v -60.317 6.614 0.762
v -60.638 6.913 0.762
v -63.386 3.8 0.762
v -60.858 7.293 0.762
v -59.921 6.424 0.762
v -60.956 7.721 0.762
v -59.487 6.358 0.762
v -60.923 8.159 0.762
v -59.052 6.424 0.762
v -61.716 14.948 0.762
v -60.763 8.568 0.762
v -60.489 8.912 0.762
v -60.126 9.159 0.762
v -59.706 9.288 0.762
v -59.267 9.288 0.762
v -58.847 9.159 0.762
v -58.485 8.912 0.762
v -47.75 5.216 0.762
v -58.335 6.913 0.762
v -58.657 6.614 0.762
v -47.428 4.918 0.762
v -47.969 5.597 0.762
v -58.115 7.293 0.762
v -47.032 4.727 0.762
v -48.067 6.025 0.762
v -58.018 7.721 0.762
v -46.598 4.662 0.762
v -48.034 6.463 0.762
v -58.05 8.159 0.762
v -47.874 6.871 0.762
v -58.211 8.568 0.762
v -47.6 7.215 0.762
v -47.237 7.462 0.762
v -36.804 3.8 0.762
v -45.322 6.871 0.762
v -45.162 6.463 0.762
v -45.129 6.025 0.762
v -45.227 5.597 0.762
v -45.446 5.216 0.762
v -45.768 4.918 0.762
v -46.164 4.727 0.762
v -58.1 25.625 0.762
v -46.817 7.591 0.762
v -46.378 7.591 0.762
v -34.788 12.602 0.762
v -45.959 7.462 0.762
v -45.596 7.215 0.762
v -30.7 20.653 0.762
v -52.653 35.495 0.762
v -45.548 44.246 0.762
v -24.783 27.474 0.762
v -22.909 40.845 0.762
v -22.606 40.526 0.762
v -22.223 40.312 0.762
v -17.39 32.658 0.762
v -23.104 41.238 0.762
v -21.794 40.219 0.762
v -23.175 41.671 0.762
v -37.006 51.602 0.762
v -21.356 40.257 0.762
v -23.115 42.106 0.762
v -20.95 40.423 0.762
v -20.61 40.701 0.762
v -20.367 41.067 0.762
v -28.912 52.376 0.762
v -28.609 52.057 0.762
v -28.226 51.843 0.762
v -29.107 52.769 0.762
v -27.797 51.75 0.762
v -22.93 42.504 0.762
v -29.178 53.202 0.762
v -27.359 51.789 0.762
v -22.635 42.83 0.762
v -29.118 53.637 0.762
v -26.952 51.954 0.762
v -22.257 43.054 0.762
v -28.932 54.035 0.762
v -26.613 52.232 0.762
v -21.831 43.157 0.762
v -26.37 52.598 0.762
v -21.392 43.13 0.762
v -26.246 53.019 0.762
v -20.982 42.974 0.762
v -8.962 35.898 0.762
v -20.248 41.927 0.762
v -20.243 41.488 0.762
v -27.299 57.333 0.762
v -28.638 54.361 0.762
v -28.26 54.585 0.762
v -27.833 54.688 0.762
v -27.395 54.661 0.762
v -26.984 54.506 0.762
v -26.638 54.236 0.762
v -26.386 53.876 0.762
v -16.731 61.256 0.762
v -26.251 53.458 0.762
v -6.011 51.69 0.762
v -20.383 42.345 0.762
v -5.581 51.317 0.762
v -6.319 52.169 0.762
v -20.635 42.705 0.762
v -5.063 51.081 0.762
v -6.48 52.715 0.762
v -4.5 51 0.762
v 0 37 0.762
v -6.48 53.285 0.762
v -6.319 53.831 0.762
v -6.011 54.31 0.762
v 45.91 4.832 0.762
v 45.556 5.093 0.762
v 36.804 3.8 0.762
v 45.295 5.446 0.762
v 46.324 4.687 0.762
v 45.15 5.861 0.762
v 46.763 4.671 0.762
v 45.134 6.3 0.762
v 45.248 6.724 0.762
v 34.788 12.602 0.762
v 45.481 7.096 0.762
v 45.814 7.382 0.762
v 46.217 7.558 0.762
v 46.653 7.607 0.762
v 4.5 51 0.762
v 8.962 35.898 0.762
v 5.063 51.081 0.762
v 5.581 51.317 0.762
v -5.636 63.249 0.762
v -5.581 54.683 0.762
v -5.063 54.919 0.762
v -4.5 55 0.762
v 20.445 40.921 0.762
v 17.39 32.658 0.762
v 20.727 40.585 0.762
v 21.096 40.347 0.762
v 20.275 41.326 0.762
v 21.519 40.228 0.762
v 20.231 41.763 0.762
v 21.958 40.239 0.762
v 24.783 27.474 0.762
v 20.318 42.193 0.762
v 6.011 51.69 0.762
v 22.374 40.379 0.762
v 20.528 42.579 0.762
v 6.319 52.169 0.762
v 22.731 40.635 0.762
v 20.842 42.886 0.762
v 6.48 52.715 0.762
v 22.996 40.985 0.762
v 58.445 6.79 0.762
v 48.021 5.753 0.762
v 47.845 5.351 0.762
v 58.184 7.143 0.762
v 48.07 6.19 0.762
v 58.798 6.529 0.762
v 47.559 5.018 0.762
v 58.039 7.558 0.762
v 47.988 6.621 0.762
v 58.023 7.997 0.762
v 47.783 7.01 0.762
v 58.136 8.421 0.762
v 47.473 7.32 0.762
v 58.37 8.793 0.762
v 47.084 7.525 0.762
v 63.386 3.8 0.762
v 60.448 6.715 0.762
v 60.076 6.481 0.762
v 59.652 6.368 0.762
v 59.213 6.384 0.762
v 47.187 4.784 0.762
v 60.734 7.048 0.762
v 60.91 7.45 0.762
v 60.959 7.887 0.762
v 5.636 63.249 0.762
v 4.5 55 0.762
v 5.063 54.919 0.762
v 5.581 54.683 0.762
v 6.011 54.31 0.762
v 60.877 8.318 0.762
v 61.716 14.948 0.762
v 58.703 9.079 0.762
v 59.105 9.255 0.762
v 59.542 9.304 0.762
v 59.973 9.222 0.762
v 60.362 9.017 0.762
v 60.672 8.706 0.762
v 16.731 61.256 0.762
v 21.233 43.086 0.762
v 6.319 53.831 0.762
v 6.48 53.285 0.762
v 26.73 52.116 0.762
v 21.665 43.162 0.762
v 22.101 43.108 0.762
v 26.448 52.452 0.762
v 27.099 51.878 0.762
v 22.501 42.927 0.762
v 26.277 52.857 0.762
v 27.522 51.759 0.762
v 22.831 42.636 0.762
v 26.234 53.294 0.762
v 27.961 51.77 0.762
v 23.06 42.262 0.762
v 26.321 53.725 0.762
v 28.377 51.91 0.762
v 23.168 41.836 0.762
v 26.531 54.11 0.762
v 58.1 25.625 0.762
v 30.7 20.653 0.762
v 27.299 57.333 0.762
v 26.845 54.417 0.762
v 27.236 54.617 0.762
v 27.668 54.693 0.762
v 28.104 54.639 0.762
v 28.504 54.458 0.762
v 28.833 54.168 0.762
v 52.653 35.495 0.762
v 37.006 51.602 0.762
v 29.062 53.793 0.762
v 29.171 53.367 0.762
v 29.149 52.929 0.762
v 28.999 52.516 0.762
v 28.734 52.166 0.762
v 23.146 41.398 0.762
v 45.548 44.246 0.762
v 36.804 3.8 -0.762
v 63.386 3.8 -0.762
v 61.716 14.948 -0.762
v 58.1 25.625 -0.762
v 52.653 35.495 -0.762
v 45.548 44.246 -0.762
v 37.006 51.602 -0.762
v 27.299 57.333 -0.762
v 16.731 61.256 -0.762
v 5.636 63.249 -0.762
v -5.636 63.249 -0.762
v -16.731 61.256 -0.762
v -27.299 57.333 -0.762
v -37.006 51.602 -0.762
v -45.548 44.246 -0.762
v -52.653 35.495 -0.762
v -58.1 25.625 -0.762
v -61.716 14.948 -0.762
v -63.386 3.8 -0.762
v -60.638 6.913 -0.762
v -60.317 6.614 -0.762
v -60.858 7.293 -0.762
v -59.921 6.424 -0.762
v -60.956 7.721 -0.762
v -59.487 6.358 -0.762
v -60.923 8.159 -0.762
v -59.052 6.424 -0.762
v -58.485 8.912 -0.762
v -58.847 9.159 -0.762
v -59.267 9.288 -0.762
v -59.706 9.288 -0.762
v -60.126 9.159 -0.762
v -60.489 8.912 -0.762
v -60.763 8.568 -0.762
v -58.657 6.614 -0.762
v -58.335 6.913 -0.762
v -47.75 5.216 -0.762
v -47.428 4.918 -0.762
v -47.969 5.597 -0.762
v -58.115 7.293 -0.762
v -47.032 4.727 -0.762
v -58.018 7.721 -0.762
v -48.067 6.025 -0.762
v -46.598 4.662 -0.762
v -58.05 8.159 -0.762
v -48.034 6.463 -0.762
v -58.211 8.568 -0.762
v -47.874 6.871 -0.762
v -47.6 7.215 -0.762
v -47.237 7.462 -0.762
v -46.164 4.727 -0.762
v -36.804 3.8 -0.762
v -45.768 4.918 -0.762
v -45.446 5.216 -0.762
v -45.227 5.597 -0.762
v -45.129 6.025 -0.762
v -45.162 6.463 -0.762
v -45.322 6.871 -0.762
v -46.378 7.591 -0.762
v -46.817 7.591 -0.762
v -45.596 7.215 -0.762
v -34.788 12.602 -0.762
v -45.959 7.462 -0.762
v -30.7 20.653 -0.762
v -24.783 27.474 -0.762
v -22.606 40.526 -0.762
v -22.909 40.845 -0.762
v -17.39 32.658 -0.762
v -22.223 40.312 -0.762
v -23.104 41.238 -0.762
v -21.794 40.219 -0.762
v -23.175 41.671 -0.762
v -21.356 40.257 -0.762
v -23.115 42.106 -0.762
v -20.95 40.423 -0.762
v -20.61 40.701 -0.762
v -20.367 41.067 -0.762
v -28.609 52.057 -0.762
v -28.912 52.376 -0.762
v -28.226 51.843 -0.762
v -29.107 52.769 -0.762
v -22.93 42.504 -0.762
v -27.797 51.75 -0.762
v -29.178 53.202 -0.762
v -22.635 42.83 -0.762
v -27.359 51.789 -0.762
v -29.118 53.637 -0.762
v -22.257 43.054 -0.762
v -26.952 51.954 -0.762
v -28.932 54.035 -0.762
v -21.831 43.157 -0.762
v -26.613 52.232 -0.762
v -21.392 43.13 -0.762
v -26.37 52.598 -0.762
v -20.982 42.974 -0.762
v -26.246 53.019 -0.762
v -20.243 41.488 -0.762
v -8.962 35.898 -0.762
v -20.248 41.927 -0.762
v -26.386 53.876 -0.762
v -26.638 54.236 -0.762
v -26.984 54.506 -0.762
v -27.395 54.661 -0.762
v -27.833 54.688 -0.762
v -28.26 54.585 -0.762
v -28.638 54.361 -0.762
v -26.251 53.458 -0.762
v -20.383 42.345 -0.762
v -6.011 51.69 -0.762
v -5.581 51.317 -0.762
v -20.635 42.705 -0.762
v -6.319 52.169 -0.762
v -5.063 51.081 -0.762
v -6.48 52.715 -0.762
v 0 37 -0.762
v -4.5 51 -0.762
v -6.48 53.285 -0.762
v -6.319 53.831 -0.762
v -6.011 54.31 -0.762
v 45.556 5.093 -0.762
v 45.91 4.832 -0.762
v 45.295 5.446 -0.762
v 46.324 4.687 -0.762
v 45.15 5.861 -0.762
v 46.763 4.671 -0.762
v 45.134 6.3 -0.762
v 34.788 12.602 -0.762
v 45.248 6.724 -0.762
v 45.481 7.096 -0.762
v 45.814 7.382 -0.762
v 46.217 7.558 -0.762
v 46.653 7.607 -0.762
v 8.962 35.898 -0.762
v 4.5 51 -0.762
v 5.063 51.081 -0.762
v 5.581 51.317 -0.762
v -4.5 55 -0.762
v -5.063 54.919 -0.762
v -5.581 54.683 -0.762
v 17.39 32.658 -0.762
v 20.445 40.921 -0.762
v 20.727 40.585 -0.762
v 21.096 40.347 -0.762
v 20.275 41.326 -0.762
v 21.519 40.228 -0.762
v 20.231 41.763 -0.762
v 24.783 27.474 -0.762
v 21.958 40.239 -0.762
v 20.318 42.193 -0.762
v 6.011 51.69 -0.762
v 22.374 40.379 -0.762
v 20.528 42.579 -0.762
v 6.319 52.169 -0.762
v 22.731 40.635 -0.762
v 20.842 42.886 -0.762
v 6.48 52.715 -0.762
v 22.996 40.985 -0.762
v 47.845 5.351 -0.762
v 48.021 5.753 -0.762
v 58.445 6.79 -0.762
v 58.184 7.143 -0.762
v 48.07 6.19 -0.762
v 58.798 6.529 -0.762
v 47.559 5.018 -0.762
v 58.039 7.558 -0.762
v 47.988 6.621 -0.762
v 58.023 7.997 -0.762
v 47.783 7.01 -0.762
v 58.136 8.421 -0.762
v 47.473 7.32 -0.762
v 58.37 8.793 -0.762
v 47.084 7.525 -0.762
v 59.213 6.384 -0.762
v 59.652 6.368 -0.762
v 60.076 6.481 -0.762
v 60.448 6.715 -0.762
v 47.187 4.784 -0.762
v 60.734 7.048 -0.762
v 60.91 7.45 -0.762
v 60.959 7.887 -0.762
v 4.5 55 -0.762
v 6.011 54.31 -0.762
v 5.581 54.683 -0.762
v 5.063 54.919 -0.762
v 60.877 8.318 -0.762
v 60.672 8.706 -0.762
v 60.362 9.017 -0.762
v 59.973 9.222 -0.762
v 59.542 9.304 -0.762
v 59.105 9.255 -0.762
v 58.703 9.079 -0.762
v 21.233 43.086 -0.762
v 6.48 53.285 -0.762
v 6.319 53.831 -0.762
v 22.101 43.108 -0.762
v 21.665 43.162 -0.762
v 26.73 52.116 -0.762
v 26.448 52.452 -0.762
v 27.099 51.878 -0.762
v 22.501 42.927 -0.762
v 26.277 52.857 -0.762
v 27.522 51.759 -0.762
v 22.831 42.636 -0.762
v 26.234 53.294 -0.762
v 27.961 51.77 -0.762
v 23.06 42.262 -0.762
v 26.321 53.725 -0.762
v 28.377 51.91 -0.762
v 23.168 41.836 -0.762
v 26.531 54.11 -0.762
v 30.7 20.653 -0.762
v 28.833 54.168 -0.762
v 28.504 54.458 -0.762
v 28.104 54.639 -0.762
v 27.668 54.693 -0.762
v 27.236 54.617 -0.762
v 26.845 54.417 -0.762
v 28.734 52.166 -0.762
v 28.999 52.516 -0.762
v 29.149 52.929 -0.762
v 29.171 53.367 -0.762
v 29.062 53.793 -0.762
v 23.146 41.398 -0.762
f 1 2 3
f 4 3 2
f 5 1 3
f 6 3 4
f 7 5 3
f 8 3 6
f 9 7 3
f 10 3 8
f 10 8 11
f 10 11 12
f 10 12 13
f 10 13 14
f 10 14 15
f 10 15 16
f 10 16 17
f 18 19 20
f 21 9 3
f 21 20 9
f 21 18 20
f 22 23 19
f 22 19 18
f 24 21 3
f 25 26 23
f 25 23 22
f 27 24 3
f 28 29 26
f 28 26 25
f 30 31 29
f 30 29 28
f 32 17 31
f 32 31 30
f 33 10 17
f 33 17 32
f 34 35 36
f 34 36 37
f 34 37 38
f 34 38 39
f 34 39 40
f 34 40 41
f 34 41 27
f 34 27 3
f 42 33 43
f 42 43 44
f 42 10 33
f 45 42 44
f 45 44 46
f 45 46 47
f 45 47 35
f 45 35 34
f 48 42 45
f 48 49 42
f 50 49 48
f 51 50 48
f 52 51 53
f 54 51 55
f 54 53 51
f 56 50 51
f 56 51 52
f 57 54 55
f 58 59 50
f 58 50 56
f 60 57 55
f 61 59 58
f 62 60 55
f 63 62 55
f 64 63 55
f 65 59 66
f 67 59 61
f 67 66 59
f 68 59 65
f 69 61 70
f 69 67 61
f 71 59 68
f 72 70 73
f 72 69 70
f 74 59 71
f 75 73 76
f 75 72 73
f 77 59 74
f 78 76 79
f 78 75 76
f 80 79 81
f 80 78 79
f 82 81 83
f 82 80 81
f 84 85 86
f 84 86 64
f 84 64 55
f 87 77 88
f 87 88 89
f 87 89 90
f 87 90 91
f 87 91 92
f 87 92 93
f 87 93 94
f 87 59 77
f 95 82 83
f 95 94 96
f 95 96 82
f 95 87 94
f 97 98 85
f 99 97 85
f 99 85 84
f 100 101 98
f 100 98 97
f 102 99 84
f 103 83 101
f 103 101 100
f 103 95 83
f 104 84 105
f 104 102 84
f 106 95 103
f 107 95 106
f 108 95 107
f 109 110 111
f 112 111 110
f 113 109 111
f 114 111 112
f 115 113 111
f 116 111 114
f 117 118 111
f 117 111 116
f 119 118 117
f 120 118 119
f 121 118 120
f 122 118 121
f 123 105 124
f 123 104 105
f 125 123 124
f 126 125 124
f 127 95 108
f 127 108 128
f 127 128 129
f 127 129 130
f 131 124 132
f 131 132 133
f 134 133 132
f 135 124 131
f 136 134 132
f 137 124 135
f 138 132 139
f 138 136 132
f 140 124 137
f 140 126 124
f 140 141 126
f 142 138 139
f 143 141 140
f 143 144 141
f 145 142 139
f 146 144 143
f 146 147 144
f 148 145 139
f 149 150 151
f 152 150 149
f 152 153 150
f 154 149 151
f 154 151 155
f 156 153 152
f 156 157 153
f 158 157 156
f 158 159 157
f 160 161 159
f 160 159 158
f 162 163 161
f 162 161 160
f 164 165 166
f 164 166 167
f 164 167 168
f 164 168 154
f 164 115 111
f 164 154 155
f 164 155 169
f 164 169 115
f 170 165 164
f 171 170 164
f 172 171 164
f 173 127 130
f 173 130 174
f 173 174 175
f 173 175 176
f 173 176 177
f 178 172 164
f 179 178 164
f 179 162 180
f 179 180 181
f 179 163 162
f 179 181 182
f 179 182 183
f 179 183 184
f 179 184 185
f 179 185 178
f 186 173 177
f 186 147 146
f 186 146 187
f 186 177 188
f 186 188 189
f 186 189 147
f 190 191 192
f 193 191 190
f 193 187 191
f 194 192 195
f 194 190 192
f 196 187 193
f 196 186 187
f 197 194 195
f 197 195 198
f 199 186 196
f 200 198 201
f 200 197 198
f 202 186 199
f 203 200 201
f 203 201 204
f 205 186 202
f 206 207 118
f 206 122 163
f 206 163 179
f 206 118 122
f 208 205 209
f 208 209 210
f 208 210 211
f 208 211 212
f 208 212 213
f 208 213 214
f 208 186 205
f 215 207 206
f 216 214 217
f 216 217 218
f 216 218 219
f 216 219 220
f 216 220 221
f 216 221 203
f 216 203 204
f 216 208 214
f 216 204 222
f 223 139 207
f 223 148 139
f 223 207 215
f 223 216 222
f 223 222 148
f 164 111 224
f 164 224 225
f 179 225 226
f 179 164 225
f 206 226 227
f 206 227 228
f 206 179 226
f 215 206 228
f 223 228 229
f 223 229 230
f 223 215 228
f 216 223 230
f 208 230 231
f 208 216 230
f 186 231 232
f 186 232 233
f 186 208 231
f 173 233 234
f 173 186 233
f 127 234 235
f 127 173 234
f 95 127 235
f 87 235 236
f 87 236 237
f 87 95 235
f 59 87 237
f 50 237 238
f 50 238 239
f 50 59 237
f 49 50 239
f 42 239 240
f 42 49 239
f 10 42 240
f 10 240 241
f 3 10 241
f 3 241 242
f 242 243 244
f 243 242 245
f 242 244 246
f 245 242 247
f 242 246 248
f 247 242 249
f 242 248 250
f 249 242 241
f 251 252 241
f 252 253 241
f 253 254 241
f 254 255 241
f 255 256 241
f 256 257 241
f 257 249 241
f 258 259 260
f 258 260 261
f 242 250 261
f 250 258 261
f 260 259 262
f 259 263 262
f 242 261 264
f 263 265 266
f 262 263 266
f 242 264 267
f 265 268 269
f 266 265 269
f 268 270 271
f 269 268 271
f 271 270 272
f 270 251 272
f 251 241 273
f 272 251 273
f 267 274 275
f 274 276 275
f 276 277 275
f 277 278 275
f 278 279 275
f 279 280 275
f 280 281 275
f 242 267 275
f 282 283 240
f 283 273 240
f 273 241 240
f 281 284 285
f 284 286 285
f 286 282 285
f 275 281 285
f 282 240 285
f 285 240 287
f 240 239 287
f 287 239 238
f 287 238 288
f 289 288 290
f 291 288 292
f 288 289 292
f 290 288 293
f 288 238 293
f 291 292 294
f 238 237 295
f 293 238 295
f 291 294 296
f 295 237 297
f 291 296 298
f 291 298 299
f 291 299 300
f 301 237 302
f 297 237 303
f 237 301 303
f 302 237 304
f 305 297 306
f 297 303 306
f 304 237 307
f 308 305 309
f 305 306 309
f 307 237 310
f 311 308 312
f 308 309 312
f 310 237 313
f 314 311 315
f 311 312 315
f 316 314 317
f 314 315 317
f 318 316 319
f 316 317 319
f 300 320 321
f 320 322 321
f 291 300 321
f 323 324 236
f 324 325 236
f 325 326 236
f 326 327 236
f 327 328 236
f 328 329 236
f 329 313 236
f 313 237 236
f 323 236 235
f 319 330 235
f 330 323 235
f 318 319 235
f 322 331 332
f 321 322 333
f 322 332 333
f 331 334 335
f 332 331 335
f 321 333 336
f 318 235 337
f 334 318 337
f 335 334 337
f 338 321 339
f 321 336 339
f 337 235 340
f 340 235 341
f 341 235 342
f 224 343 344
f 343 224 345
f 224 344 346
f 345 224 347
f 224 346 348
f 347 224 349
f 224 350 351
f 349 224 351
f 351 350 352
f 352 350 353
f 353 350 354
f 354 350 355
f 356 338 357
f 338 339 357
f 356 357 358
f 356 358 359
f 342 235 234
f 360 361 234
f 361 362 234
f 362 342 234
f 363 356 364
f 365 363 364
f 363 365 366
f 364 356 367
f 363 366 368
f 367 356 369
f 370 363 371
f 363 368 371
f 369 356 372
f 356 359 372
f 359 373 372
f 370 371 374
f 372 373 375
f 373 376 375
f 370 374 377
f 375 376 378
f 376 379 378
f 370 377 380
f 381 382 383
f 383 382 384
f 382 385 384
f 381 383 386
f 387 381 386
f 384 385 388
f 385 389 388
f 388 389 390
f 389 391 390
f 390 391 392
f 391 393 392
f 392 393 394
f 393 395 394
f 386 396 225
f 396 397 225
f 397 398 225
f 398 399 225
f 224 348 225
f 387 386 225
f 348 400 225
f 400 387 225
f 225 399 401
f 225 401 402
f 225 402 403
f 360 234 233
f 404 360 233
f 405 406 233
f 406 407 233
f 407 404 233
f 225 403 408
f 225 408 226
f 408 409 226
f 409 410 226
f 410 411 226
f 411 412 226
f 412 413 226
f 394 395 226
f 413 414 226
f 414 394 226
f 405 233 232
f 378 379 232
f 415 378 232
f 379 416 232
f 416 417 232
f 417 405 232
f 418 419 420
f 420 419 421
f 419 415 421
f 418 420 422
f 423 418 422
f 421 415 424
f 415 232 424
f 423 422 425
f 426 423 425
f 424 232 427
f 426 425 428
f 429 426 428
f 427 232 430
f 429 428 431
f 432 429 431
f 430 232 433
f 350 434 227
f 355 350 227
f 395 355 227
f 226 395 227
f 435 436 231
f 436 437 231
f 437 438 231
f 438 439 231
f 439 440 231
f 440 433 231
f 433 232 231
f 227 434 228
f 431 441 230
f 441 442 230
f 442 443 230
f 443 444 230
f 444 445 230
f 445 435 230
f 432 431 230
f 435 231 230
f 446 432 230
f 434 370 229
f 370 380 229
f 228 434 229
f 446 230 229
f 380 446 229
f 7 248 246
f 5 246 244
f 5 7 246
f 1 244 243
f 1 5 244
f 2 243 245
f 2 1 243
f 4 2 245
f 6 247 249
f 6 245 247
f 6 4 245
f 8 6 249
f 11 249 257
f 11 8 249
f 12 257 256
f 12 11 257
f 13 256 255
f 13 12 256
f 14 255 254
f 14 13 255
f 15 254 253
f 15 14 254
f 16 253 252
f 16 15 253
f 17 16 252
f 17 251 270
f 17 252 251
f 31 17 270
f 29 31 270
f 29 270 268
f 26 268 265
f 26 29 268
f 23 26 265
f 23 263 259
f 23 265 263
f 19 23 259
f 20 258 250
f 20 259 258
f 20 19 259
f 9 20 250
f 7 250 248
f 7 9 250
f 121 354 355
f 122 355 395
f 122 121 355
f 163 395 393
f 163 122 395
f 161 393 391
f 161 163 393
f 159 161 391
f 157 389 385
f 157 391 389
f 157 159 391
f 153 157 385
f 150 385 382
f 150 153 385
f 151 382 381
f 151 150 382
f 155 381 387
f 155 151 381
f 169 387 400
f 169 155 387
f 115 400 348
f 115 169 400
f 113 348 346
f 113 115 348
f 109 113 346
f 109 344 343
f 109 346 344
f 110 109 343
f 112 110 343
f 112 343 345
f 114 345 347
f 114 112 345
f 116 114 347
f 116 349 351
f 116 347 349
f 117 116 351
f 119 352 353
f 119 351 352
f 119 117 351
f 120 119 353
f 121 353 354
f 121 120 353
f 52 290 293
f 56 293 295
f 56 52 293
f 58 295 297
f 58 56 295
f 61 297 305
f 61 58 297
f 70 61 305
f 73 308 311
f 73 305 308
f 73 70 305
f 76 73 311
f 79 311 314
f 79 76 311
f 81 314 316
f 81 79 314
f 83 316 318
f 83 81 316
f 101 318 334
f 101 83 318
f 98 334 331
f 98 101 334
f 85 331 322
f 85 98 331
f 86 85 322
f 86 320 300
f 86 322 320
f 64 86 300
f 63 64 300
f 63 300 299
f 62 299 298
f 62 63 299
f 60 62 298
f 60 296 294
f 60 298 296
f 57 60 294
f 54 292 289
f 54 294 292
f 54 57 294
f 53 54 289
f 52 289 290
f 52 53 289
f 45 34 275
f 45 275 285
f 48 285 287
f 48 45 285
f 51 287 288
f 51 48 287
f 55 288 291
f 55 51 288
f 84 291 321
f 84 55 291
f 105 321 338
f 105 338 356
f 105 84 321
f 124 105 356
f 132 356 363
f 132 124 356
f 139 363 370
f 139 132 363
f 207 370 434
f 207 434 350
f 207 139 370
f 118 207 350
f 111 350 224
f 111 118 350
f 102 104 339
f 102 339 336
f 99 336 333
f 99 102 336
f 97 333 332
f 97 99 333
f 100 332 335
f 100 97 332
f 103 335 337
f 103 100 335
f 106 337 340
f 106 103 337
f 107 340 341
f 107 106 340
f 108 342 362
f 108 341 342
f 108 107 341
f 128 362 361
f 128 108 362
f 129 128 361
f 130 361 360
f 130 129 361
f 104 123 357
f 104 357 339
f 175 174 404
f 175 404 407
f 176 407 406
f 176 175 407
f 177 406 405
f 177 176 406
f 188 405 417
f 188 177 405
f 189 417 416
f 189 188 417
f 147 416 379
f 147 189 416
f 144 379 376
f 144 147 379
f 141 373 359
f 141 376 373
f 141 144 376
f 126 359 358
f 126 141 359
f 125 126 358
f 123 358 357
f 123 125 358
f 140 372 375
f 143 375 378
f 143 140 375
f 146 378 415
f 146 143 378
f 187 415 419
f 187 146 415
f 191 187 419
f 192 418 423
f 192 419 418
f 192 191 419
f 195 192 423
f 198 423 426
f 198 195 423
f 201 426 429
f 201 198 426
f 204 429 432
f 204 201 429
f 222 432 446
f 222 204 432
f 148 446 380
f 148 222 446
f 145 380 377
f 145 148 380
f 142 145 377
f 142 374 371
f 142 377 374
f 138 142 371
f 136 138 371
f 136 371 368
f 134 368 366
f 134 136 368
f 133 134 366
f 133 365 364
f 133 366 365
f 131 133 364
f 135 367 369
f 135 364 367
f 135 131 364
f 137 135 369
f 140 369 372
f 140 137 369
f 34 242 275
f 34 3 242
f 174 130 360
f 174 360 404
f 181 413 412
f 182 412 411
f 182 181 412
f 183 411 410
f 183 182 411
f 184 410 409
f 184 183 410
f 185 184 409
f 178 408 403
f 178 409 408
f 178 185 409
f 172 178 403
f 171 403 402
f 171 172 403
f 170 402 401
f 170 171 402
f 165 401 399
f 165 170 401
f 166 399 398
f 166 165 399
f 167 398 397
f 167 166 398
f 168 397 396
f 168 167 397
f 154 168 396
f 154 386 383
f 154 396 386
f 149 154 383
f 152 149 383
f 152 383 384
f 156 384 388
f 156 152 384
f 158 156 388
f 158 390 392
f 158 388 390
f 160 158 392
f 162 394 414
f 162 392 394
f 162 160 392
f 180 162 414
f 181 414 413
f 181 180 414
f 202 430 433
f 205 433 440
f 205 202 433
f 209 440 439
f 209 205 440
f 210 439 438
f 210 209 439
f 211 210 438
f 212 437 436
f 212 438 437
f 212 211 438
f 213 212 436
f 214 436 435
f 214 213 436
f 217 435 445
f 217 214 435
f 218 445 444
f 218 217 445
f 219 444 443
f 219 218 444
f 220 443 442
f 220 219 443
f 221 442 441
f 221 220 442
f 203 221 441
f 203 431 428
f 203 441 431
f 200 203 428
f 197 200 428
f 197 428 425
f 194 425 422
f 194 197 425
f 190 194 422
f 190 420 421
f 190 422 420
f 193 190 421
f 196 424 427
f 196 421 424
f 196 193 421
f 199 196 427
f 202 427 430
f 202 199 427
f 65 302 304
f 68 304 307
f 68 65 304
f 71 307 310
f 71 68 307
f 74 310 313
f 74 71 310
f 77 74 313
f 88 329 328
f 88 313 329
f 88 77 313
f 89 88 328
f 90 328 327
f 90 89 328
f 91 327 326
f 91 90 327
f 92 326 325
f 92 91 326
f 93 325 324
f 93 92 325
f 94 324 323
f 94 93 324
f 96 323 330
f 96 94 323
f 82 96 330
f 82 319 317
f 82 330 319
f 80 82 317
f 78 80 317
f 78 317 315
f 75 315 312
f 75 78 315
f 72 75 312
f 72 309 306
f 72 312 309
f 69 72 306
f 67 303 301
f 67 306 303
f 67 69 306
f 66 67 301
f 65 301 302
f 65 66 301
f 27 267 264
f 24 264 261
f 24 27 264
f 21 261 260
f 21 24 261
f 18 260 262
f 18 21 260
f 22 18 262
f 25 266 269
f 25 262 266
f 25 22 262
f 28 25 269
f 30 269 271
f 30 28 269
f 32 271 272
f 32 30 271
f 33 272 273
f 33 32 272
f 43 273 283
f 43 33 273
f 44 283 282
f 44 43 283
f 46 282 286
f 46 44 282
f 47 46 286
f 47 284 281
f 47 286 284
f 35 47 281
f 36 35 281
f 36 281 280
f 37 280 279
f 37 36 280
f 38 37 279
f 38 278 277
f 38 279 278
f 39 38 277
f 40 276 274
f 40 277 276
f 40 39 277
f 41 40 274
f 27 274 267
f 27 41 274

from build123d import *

# Parameters (mm, degrees)
BOSS_EXTRUDE1_DEPTH            = 0.762
F_4_CLEARANCE_HOLE1_AT_2_COUNT = 2
F_4_CLEARANCE_HOLE1_AT_2_PITCH = 13
CIRPATTERN1_COUNT              = 4
CIRPATTERN1_ANGLE              = 165
CUT_EXTRUDE1_DEPTH             = 2.524


with BuildPart() as part:
    # Sketch1 → Boss-Extrude1 (new body, symmetric)
    with BuildSketch(Plane.XY):
        with BuildLine():
            Line((-63.386197236, 3.8), (-36.804347569, 3.8))
            ThreePointArc((-36.804347569, 3.8), (0, 37), (36.804347569, 3.8))
            Line((36.804347569, 3.8), (63.386197236, 3.8))
            ThreePointArc((63.386197236, 3.8), (0, 63.5), (-63.386197236, 3.8))
        make_face()
    extrude(amount=BOSS_EXTRUDE1_DEPTH, both=True)

    # Sketch2 → #4 Clearance Hole1 (revolve, cut)
    with BuildSketch(Plane(origin=(-59.486691682, 7.831571533, 0.762), x_dir=(0, -1, 0), z_dir=(1, 0, 0))):
        Polygon((0, 0), (0, 136.775187864), (1.4732, 135.89), (1.4732, 0), align=None)
    f_4_clearance_hole1 = revolve(axis=Axis((-59.486691682, 7.831571533, 7.112), (0, 0, -1)), mode=Mode.SUBTRACT)

    # #4 Clearance Hole1 at 2: #4 Clearance Hole1 ×2
    with Locations(*[Vector(0.991444861, -0.130526192, 0) * (i * F_4_CLEARANCE_HOLE1_AT_2_PITCH) for i in range(1, F_4_CLEARANCE_HOLE1_AT_2_COUNT)]):
        add(f_4_clearance_hole1, mode=Mode.SUBTRACT)

    # CirPattern1: #4 Clearance Hole1 ×4 about axis
    cirpattern1_axis = Axis((0, 0, 0), (0, 0, -1))
    for i in range(1, CIRPATTERN1_COUNT):
        add(f_4_clearance_hole1.rotate(cirpattern1_axis, i * CIRPATTERN1_ANGLE / (CIRPATTERN1_COUNT - 1)), mode=Mode.SUBTRACT)

    # CirPattern1 copy 1 sketch → CirPattern1 copy 1 (revolve, cut)
    with BuildSketch(Plane(origin=(-21.702184822, 41.689509159, 0.762), x_dir=(-0.819152044, -0.573576436, 0), z_dir=(0.573576436, -0.819152044, 0))):
        Polygon((0, 0), (0, 136.775187864), (1.4732, 135.89), (1.4732, 0), align=None)
    revolve(axis=Axis((-21.702184822, 41.689509159, 7.112), (0, 0, -1)), mode=Mode.SUBTRACT)

    # CirPattern1 copy 2 sketch → CirPattern1 copy 2 (revolve, cut)
    with BuildSketch(Plane(origin=(21.702184822, 41.689509159, 0.762), x_dir=(-0.939692621, 0.342020143, 0), z_dir=(-0.342020143, -0.939692621, 0))):
        Polygon((0, 0), (0, 136.775187864), (1.4732, 135.89), (1.4732, 0), align=None)
    revolve(axis=Axis((21.702184822, 41.689509159, 7.112), (0, 0, -1)), mode=Mode.SUBTRACT)

    # CirPattern1 copy 3 sketch → CirPattern1 copy 3 (revolve, cut)
    with BuildSketch(Plane(origin=(46.597908485, 6.134731034, 0.762), x_dir=(-0.258819045, 0.965925826, 0), z_dir=(-0.965925826, -0.258819045, 0))):
        Polygon((0, 0), (0, 136.775187864), (1.4732, 135.89), (1.4732, 0), align=None)
    revolve(axis=Axis((46.597908485, 6.134731034, 7.112), (0, 0, -1)), mode=Mode.SUBTRACT)

    # Sketch4 → Cut-Extrude1 (cut, through all)
    with BuildSketch(Plane.XY.offset(0.762)):
        with BuildLine():
            Line((-4.5, 55), (4.5, 55))
            ThreePointArc((4.5, 55), (6.5, 53), (4.5, 51))
            Line((4.5, 51), (-4.5, 51))
            ThreePointArc((-4.5, 51), (-6.5, 53), (-4.5, 55))
        make_face()
    extrude(amount=-CUT_EXTRUDE1_DEPTH, mode=Mode.SUBTRACT)


solid = part.part
